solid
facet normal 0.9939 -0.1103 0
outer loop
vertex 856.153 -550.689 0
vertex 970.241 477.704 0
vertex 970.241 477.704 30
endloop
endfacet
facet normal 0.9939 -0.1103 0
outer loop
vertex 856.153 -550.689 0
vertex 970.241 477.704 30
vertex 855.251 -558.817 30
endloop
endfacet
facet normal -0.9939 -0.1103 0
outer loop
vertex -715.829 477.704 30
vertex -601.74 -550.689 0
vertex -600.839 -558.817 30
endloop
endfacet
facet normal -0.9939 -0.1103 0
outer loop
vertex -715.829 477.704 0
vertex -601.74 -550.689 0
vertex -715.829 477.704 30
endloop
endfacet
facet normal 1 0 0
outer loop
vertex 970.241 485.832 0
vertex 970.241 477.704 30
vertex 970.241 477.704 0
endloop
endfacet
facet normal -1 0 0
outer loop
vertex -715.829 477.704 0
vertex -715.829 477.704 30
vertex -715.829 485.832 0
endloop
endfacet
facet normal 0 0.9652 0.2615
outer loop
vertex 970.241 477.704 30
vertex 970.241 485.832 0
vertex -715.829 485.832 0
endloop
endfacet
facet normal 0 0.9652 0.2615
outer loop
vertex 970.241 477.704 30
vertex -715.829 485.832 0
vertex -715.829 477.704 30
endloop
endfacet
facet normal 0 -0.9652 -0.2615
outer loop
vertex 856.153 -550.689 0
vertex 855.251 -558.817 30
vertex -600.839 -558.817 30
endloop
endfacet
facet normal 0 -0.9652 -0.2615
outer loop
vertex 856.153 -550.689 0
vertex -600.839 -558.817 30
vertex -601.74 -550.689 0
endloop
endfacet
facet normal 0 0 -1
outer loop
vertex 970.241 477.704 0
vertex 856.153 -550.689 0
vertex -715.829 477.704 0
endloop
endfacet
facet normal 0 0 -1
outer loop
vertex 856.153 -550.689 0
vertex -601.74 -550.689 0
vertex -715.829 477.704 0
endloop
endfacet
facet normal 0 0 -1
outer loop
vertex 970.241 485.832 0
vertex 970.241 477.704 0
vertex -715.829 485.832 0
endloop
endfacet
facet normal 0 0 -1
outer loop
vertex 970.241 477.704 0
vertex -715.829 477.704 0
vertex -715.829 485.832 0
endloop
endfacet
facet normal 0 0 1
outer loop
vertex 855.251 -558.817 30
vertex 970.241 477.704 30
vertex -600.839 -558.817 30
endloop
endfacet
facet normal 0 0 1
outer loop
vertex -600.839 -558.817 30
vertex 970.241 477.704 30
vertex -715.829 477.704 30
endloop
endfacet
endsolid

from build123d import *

# Parameters (mm, degrees)
BOSS_EXTRU_1_DEPTH           = 30
BOSS_EXTRU_2_DEPTH           = 970.2413
BOSS_EXTRU_2_DEPTH_BACK      = 715.8287
ENL_V_MAT_EXTRU_1_DEPTH      = 970.2413
ENL_V_MAT_EXTRU_1_DEPTH_BACK = 970.2413


with BuildPart() as part:
    # Esquisse1 → Boss.-Extru.1 (new body)
    with BuildSketch(Plane.XY):
        Polygon((-715.828706454, 477.703685082), (970.241293546, 477.703685082), (855.251293546, -558.817416632), (-600.838706454, -558.817416632), align=None)
    extrude(amount=BOSS_EXTRU_1_DEPTH)

    # Esquisse2 → Boss.-Extru.2 (add, two sides: drawn at the far end of the back side and taken through both)
    with BuildSketch(Plane(origin=(0, 0, 0), x_dir=(0, 0, -1), z_dir=(1, 0, 0)).offset(-BOSS_EXTRU_2_DEPTH_BACK)):
        Polygon((-30, 477.703685082), (0, 477.703685082), (0, 485.832018962), align=None)
    extrude(amount=BOSS_EXTRU_2_DEPTH + BOSS_EXTRU_2_DEPTH_BACK)

    # Esquisse3 → Enlèv. mat.-Extru.1 (cut, two sides: drawn at the far end of the back side and taken through both)
    with BuildSketch(Plane(origin=(0, 0, 0), x_dir=(0, 0, -1), z_dir=(1, 0, 0)).offset(-ENL_V_MAT_EXTRU_1_DEPTH_BACK)):
        Polygon((-30, -558.817416632), (0, -550.689082753), (0, -558.817416632), align=None)
    extrude(amount=ENL_V_MAT_EXTRU_1_DEPTH + ENL_V_MAT_EXTRU_1_DEPTH_BACK, mode=Mode.SUBTRACT)


solid = part.part
